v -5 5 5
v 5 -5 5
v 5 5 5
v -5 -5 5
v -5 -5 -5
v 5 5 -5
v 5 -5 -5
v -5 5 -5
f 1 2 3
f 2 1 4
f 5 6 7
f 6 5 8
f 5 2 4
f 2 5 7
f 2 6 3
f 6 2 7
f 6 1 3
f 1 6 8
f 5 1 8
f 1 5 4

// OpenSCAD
/**
 * Basic Animation
 * No animation: $t = 0
 * During animation: $t in [0..1]
 */

module drawSomethingNice() {
	echo("T:", $t);
	rotate([0, 0, ($t * 360) % 360]) {
		cube(10, center=true);
	}
}	

drawSomethingNice();
